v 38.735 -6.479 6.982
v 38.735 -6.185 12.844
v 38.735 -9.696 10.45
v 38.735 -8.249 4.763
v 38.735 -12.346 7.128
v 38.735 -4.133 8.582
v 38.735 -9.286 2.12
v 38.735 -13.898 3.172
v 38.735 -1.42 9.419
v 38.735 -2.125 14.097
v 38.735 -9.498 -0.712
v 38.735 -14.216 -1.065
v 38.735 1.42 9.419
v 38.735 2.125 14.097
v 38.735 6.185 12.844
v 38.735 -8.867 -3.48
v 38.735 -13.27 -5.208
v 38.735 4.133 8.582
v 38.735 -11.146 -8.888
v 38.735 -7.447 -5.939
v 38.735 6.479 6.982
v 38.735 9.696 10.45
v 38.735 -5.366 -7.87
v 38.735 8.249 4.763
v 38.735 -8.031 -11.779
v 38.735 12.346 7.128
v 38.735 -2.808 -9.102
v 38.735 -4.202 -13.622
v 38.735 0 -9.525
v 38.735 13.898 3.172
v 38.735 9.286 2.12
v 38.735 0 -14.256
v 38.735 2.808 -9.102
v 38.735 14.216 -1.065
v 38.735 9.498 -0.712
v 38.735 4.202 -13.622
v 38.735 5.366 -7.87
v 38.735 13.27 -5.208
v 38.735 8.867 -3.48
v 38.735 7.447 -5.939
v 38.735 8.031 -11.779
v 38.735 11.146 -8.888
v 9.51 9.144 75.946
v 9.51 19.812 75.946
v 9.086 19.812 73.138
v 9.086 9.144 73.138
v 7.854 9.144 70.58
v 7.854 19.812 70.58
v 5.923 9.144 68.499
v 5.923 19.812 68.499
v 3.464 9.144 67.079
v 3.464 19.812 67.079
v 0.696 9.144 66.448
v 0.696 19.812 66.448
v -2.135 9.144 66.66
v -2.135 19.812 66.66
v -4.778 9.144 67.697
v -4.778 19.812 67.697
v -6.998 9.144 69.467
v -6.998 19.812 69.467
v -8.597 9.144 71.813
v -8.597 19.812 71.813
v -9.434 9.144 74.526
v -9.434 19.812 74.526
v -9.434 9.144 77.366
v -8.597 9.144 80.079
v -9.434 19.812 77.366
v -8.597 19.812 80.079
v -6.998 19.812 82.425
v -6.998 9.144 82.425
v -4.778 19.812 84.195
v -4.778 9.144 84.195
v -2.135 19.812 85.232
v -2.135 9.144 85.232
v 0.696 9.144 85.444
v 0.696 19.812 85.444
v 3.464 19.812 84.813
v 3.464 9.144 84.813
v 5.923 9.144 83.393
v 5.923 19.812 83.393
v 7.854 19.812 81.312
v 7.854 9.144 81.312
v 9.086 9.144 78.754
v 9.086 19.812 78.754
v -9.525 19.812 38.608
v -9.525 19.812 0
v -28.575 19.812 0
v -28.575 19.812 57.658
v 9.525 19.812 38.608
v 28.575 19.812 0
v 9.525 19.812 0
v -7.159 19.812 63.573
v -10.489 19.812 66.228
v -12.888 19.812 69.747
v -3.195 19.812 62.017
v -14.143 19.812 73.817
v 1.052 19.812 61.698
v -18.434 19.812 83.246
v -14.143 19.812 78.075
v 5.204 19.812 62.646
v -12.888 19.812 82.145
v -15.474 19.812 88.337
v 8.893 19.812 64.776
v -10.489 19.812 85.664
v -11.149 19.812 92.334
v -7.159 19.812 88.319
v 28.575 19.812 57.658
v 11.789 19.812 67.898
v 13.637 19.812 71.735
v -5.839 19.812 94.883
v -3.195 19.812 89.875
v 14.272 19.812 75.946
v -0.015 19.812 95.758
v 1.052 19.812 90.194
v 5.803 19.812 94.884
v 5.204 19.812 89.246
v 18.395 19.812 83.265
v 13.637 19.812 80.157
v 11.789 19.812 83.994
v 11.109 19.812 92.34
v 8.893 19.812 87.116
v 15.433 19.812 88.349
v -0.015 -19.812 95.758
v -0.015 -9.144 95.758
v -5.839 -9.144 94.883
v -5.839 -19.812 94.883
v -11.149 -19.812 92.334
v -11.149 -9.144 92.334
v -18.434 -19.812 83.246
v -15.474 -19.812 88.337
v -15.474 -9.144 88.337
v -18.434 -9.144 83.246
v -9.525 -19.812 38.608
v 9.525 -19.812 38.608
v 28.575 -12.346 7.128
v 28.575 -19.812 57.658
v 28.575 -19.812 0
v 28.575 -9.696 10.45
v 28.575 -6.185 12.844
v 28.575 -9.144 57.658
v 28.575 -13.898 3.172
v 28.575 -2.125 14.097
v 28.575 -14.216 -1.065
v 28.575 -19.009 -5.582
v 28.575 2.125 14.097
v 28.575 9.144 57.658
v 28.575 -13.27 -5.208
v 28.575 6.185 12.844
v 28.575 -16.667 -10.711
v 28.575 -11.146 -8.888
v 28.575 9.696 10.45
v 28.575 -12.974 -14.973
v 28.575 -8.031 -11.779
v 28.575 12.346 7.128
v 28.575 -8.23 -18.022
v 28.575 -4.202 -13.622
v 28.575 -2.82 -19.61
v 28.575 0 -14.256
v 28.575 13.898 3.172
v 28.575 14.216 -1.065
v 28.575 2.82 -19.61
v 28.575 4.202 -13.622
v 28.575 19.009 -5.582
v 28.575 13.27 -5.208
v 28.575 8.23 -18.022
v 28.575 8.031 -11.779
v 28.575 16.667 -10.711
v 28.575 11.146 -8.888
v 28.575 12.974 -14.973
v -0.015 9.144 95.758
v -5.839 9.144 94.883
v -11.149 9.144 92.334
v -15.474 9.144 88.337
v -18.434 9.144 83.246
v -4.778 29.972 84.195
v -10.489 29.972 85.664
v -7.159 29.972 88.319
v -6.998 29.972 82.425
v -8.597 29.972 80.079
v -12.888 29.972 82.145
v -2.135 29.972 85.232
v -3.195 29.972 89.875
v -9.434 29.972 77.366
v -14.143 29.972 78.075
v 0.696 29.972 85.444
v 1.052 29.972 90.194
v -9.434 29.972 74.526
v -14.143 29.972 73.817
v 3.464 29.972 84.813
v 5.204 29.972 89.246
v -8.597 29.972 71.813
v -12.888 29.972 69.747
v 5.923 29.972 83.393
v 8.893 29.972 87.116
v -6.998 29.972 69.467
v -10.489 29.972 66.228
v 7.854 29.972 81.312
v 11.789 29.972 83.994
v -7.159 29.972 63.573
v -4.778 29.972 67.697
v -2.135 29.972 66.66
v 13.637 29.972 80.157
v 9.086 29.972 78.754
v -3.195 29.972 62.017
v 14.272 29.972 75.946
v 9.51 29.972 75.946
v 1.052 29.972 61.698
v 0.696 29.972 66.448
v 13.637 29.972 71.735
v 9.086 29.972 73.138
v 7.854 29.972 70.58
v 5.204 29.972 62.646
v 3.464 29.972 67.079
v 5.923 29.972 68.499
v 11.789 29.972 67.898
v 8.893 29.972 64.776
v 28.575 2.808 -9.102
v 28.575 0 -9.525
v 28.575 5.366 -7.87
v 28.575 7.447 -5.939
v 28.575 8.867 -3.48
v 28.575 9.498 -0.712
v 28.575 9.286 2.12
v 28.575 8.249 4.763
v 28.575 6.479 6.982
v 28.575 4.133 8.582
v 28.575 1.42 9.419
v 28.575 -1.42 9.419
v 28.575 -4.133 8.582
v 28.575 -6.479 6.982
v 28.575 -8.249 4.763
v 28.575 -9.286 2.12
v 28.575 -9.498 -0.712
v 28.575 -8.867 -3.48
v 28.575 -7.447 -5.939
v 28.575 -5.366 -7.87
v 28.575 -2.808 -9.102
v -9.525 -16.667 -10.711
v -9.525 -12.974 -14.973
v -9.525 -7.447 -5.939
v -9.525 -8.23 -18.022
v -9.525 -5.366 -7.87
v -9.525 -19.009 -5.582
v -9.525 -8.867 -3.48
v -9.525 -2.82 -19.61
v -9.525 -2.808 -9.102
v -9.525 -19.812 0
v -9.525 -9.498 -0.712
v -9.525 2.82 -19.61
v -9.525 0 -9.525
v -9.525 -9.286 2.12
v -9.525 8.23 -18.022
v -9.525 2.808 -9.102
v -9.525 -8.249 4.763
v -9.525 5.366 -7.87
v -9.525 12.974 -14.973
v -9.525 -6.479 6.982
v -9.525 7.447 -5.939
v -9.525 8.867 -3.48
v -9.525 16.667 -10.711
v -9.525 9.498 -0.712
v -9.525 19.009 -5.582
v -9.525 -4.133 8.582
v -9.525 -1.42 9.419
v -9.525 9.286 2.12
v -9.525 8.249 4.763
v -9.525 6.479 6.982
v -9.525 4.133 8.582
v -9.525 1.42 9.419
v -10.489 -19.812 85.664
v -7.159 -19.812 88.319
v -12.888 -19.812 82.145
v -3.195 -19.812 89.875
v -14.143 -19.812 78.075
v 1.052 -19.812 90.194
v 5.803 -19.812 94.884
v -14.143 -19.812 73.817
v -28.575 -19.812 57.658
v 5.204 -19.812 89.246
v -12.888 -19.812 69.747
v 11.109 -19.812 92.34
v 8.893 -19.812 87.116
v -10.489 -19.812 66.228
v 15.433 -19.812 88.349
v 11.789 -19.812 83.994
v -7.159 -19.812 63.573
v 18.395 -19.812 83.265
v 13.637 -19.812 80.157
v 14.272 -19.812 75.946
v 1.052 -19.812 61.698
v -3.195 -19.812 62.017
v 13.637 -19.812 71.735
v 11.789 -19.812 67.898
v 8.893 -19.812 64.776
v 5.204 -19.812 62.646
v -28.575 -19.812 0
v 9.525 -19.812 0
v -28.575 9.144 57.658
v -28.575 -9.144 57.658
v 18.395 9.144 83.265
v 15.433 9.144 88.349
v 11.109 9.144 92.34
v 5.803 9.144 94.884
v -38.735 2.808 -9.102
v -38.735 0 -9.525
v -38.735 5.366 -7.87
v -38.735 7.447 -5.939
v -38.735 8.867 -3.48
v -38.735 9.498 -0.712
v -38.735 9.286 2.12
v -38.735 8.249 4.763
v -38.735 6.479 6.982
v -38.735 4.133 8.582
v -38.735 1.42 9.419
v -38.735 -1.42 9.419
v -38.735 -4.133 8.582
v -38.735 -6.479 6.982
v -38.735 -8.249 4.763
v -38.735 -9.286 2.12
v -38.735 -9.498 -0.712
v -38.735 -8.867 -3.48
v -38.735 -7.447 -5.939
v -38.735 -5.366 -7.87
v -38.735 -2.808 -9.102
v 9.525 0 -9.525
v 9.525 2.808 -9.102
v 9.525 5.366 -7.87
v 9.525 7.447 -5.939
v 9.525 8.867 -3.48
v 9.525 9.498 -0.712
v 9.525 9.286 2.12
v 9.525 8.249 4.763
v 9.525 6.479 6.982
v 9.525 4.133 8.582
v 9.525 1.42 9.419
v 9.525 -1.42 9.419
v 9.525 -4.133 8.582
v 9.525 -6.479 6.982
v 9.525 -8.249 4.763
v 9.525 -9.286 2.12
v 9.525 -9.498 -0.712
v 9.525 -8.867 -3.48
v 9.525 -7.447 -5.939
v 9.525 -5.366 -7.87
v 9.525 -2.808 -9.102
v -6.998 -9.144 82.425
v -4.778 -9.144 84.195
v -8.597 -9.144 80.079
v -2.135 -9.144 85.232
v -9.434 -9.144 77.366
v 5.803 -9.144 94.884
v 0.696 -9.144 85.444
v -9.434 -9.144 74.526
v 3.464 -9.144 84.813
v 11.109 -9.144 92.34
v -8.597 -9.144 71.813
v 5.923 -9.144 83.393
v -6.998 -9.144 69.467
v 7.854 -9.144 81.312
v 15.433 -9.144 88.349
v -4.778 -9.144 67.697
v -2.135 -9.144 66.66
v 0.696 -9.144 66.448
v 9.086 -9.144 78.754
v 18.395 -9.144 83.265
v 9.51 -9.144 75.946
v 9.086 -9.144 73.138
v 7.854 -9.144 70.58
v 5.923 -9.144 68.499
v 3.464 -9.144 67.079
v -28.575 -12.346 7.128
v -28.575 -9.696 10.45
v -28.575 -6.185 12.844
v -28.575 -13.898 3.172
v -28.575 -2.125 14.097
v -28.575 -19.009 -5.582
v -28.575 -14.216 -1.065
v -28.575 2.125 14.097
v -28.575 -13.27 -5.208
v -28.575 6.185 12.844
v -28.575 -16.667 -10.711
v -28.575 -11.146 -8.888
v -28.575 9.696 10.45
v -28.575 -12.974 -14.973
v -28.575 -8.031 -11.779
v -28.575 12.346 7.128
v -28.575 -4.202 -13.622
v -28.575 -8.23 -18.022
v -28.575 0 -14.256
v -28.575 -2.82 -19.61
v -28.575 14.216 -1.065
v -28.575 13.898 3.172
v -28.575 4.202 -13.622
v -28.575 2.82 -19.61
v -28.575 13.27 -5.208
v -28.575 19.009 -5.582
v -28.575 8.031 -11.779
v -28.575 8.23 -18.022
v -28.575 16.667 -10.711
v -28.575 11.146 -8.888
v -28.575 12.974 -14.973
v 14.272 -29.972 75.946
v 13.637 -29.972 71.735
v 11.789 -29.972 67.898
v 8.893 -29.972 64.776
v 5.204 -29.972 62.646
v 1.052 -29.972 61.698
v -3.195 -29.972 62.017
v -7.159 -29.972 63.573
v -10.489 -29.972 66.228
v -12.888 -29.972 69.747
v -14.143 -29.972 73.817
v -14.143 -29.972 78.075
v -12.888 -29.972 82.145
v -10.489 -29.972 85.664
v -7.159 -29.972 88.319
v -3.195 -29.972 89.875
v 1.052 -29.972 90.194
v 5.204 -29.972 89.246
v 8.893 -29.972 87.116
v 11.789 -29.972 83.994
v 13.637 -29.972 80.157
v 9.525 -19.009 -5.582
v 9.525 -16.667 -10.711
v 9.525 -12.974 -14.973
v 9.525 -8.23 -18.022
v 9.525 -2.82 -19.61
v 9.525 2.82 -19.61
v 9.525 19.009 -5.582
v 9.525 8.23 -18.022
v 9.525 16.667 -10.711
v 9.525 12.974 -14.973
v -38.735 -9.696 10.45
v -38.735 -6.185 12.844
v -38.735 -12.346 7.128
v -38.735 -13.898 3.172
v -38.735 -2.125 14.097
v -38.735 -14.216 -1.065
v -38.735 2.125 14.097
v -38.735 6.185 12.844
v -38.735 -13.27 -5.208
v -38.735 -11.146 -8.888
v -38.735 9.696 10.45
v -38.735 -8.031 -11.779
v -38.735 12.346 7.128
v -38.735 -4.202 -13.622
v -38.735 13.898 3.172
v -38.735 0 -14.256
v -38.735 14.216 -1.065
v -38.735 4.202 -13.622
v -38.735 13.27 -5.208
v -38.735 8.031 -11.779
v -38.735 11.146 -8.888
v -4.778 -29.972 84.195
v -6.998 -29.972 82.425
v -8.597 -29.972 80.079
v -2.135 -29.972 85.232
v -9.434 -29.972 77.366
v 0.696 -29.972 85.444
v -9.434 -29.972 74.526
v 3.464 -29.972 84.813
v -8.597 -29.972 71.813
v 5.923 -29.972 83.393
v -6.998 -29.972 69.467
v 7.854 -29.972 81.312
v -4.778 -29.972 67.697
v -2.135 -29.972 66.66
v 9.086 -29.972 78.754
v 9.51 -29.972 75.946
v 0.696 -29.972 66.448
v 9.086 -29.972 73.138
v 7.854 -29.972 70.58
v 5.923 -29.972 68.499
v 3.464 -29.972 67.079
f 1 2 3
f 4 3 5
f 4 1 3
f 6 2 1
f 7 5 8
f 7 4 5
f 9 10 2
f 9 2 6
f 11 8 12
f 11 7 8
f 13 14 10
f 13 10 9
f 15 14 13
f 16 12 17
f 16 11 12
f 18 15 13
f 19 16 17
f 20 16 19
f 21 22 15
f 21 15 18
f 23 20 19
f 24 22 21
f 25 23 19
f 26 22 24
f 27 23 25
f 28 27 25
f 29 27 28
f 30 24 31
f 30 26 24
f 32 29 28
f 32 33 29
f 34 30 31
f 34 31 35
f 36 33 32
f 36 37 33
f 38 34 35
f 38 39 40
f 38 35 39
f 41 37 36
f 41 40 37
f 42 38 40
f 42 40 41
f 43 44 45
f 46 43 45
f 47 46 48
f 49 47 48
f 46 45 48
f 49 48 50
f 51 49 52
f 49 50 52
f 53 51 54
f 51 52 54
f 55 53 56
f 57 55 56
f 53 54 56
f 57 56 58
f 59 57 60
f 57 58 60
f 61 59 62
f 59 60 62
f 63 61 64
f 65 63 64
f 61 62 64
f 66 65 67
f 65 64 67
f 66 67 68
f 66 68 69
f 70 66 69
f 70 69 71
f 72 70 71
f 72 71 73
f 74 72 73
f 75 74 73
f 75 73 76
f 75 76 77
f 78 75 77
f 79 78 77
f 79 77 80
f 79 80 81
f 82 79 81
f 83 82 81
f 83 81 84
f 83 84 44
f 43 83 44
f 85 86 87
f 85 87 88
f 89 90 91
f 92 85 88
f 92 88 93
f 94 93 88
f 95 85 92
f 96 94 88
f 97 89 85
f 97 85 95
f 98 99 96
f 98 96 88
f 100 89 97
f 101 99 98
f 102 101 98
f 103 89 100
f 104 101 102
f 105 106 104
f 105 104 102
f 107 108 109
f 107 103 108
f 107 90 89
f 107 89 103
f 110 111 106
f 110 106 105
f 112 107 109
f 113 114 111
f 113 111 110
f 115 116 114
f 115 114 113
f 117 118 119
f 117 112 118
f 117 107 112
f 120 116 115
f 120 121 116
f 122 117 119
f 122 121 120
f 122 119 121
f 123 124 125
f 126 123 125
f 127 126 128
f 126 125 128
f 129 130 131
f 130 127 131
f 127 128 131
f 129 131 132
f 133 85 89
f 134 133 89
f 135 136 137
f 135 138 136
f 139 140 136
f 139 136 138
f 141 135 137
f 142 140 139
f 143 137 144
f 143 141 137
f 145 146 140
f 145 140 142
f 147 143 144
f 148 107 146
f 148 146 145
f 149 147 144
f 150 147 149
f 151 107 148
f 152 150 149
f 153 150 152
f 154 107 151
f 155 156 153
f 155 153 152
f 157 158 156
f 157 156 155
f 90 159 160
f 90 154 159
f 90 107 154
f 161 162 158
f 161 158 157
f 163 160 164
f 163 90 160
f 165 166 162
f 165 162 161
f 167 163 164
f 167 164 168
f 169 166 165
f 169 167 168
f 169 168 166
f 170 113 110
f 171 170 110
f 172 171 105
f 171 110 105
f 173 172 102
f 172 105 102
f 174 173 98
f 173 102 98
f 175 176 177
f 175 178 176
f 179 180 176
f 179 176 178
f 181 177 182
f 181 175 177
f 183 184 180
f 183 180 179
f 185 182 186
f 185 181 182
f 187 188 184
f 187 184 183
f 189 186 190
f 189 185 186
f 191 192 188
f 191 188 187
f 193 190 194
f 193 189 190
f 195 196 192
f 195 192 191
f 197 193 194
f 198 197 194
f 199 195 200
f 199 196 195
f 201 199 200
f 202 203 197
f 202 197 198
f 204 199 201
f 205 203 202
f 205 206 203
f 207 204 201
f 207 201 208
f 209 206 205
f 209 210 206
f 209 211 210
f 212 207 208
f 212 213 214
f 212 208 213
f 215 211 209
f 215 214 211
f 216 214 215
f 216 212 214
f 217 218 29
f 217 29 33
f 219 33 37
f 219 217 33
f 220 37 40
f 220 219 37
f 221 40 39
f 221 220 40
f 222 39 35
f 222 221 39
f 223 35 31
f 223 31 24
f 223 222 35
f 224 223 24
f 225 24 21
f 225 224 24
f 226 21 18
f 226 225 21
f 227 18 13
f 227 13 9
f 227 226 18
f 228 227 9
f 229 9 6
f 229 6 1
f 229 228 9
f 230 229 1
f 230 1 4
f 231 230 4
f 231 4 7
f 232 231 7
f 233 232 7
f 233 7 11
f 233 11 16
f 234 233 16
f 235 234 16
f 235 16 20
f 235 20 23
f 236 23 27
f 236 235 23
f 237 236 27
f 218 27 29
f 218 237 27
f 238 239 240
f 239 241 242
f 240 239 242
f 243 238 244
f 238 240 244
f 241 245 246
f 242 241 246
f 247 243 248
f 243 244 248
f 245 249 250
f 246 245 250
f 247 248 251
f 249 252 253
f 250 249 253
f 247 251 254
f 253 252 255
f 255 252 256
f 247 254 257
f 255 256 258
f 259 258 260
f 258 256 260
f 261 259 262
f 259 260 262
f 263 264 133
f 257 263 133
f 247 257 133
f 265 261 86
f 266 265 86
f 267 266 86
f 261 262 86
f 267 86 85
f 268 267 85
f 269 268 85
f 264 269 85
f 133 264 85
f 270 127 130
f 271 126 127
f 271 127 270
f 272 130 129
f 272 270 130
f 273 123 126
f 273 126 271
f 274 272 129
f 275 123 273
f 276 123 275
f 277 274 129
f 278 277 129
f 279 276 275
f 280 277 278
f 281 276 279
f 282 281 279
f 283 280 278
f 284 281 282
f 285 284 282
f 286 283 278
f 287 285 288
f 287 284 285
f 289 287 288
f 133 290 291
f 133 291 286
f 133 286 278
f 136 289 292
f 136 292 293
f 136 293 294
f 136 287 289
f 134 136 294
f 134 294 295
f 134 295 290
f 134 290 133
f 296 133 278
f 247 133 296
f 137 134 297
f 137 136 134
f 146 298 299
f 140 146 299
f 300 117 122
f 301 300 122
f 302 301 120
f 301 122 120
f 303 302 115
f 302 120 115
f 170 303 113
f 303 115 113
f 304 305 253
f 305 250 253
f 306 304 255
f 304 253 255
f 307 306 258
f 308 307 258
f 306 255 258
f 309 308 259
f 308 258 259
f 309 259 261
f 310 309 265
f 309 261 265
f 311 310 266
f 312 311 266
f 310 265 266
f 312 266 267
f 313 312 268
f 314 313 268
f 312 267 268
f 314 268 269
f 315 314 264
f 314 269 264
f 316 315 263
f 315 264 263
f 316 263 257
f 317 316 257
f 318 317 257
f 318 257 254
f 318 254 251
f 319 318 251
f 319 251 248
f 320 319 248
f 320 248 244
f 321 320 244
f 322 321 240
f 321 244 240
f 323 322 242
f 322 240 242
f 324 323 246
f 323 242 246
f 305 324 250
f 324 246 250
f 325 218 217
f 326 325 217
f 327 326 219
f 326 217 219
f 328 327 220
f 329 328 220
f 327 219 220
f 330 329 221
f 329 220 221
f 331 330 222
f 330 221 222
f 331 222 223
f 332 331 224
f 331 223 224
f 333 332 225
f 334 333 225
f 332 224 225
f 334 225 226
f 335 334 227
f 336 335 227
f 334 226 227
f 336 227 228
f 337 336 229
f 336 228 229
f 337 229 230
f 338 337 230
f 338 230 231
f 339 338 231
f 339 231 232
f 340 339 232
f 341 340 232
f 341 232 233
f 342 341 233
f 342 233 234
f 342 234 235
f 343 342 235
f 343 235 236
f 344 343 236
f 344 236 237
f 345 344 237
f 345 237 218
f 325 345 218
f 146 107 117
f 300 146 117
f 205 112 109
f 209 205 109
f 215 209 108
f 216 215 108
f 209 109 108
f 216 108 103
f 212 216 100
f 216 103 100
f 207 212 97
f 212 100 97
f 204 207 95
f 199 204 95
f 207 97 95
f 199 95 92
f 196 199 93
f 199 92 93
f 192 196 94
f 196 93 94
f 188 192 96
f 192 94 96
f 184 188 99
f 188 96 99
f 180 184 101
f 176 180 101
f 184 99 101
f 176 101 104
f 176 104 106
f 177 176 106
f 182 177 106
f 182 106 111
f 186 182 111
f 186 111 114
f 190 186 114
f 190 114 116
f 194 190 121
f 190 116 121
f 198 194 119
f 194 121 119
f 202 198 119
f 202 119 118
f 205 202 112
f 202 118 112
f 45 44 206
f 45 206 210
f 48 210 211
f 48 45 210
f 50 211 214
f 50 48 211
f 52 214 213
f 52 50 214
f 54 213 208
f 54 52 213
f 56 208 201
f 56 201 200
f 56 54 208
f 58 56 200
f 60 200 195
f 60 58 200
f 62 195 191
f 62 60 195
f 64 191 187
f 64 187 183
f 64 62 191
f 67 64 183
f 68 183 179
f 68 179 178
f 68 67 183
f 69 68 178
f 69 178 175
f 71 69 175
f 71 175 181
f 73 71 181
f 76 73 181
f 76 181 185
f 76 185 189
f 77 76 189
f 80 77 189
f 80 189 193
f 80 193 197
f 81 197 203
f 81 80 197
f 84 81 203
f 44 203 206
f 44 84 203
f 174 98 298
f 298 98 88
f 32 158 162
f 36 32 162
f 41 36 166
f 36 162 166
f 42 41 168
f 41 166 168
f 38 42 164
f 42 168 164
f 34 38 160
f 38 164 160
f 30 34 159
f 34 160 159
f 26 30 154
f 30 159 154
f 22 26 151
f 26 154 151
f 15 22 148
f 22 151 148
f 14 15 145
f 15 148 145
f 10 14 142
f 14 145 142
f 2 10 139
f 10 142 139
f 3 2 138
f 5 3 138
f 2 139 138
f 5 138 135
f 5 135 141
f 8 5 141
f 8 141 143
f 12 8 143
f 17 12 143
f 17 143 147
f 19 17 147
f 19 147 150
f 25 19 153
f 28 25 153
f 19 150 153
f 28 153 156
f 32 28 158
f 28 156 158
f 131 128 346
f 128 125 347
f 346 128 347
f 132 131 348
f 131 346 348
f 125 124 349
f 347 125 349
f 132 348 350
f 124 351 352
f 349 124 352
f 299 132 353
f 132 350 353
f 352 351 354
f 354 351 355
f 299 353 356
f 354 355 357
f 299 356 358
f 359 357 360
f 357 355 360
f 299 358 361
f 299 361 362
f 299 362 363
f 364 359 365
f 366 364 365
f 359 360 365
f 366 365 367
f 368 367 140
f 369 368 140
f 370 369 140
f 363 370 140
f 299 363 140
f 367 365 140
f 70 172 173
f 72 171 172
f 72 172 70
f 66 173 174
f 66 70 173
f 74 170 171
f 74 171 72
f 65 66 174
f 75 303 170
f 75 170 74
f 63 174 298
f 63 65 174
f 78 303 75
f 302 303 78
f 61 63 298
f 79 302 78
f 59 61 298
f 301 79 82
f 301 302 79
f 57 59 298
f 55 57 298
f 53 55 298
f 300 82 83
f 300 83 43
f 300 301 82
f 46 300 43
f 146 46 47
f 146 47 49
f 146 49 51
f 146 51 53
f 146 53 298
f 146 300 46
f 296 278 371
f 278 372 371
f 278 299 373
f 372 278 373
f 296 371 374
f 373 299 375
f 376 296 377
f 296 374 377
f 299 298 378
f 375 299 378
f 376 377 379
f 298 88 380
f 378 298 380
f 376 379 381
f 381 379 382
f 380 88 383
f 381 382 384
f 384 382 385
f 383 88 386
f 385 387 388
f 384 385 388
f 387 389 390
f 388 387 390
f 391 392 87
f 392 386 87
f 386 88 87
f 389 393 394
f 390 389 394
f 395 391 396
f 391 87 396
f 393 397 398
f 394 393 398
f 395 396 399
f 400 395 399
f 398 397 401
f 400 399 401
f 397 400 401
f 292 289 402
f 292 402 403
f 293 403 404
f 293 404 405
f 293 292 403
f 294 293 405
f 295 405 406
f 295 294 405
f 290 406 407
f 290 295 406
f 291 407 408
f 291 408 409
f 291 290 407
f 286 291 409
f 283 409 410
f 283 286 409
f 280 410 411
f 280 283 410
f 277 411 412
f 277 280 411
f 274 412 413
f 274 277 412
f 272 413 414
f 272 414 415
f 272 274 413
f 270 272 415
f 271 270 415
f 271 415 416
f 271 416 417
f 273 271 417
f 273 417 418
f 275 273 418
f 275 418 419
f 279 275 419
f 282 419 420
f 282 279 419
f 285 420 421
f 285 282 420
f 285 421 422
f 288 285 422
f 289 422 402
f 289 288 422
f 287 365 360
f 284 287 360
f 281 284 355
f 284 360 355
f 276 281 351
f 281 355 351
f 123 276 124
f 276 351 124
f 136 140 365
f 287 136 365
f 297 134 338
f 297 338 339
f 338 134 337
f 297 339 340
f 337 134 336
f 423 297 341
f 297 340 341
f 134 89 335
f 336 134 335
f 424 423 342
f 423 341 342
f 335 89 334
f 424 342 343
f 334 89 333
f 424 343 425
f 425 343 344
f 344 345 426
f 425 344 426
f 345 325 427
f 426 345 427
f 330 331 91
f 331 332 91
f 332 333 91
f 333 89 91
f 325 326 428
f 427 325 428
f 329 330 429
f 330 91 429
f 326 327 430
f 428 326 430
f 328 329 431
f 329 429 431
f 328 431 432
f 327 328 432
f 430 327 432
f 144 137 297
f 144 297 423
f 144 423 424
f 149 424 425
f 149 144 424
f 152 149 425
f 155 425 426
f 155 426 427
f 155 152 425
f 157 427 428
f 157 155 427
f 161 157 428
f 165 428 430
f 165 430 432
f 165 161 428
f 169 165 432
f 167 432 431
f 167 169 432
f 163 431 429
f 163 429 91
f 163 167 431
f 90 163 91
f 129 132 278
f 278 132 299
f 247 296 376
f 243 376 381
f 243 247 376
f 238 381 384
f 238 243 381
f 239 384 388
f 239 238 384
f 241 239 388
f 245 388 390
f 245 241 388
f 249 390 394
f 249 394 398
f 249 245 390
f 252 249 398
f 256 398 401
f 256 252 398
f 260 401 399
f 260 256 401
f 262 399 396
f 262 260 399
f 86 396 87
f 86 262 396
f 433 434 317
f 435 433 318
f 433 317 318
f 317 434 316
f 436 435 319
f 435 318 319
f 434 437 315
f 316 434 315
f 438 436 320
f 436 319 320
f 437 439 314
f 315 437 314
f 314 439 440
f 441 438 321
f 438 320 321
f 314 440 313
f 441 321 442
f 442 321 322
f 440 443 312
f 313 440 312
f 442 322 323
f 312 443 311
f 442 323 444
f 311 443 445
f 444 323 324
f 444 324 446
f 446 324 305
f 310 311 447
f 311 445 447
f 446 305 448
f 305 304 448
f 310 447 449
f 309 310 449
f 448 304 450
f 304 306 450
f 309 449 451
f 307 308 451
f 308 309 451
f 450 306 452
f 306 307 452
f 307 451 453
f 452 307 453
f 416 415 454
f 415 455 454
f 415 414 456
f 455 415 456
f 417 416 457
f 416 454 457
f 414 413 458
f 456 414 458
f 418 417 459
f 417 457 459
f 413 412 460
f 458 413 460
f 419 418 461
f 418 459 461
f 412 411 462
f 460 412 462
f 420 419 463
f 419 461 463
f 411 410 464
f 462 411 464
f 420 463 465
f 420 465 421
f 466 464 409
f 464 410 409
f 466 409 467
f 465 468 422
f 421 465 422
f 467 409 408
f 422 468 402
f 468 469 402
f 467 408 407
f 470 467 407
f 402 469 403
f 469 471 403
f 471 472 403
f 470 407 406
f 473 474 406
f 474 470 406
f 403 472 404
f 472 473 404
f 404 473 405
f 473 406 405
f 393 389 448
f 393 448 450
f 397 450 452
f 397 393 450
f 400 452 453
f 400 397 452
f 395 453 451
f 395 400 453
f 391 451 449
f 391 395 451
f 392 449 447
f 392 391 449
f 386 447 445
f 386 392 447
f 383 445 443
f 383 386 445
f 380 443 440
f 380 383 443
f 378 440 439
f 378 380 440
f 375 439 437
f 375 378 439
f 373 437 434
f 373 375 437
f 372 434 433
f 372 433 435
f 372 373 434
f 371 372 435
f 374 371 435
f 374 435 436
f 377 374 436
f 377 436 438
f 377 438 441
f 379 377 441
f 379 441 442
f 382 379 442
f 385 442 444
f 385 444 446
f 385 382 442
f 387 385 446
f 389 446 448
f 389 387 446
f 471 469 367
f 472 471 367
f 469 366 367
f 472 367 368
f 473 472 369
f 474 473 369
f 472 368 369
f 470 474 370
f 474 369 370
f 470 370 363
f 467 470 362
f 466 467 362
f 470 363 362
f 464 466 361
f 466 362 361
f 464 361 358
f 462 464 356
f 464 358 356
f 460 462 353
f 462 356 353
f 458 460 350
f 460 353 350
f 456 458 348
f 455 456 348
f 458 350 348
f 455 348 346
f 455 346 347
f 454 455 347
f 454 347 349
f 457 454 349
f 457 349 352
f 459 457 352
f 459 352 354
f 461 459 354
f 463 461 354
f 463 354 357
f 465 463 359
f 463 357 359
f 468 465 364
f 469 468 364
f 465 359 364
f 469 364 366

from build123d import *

# Parameters (mm, degrees)
SKETCH3_W           = 38.1
SKETCH3_H           = 10.668
BOSS_EXTRUDE1_DEPTH = 28.575
SKETCH4_W           = 19.05
SKETCH4_H           = 38.608
SKETCH4_H_2         = 19.812
SKETCH4_R           = 9.525
CUT_EXTRUDE1_DEPTH  = 40.624
SKETCH5_R           = 14.2875
SKETCH5_R_2         = 9.525
BOSS_EXTRUDE2_DEPTH = 10.16
BOSS_EXTRUDE3_START = -39.624
SKETCH5_3_R         = 14.2875
SKETCH5_3_R_2       = 9.525
BOSS_EXTRUDE3_DEPTH = 10.16
SKETCH6_R           = 9.525
CUT_EXTRUDE2_DEPTH  = 58.15
SKETCH7_R           = 14.25575
SKETCH7_R_2         = 9.525
BOSS_EXTRUDE4_DEPTH = 10.16
BOSS_EXTRUDE5_START = -57.15
SKETCH7_2_R         = 14.25575
SKETCH7_2_R_2       = 9.525
BOSS_EXTRUDE5_DEPTH = 10.16


with BuildPart() as part:
    # Sketch3 → Boss-Extrude1 (new body, symmetric)
    with BuildSketch(Plane(origin=(0, 0, 0), x_dir=(0, 0, -1), z_dir=(1, 0, 0))):
        with BuildLine():
            ThreePointArc((0, -19.812), (19.812, 0), (0, 19.812))
            Line((0, 19.812), (-57.658, 19.812))
            Line((-57.658, 19.812), (-57.658, 9.144))
            Line((-57.658, 9.144), (-57.658, -9.144))
            Line((-57.658, -9.144), (-57.658, -19.812))
            Line((-57.658, -19.812), (0, -19.812))
        make_face()
        with Locations((-76.708, 14.478)):
            Rectangle(SKETCH3_W, SKETCH3_H)
        with Locations((-76.708, -14.478)):
            Rectangle(SKETCH3_W, SKETCH3_H)
    extrude(amount=BOSS_EXTRUDE1_DEPTH, both=True)

    # Sketch4 → Cut-Extrude1 (cut, through all)
    with BuildSketch(Plane(origin=(0, 19.812, 0), x_dir=(1, 0, 0), z_dir=(0, 1, 0))):
        with Locations((0, -19.304)):
            Rectangle(SKETCH4_W, SKETCH4_H)
        with Locations((0, 9.906)):
            Rectangle(SKETCH4_W, SKETCH4_H_2)
        with BuildLine():
            Line((28.575, -95.758), (28.575, -57.658))
            Line((28.575, -57.658), (18.395099317, -83.264992565))
            ThreePointArc((18.395099317, -83.264992565), (11.109122589, -92.339889472), (-0.015432736, -95.758))
            Line((-0.015432736, -95.758), (28.575, -95.758))
        make_face()
        with Locations((-0.015432773, -75.946)):
            Circle(SKETCH4_R)
        with BuildLine():
            Line((-18.433578911, -83.24581074), (-28.575, -57.658))
            Line((-28.575, -57.658), (-28.575, -95.758))
            Line((-28.575, -95.758), (-0.015432736, -95.758))
            ThreePointArc((-0.015432736, -95.758), (-11.148525176, -92.334093164), (-18.433578911, -83.24581074))
        make_face()
    extrude(amount=-CUT_EXTRUDE1_DEPTH, mode=Mode.SUBTRACT)

    # Sketch5 → Boss-Extrude2 (add)
    with BuildSketch(Plane(origin=(0, 19.812, 0), x_dir=(1, 0, 0), z_dir=(0, 1, 0))):
        with Locations((-0.015432773, -75.946)):
            Circle(SKETCH5_R)
        with Locations((-0.015432773, -75.946)):
            Circle(SKETCH5_R_2, mode=Mode.SUBTRACT)
    extrude(amount=BOSS_EXTRUDE2_DEPTH)

    # Sketch5<3> → Boss-Extrude3 (add)
    with BuildSketch(Plane(origin=(0, 19.812, 0), x_dir=(1, 0, 0), z_dir=(0, 1, 0)).offset(BOSS_EXTRUDE3_START)):
        with Locations((-0.015432773, -75.946)):
            Circle(SKETCH5_3_R)
        with Locations((-0.015432773, -75.946)):
            Circle(SKETCH5_3_R_2, mode=Mode.SUBTRACT)
    extrude(amount=-BOSS_EXTRUDE3_DEPTH)

    # Sketch6 → Cut-Extrude2 (cut, through all)
    with BuildSketch(Plane(origin=(28.575, 0, 0), x_dir=(0, 0, -1), z_dir=(1, 0, 0))):
        Circle(SKETCH6_R)
    extrude(amount=-CUT_EXTRUDE2_DEPTH, mode=Mode.SUBTRACT)

    # Sketch7 → Boss-Extrude4 (add)
    with BuildSketch(Plane(origin=(28.575, 0, 0), x_dir=(0, 0, -1), z_dir=(1, 0, 0))):
        Circle(SKETCH7_R)
        Circle(SKETCH7_R_2, mode=Mode.SUBTRACT)
    extrude(amount=BOSS_EXTRUDE4_DEPTH)

    # Sketch7<2> → Boss-Extrude5 (add)
    with BuildSketch(Plane(origin=(28.575, 0, 0), x_dir=(0, 0, -1), z_dir=(1, 0, 0)).offset(BOSS_EXTRUDE5_START)):
        Circle(SKETCH7_2_R)
        Circle(SKETCH7_2_R_2, mode=Mode.SUBTRACT)
    extrude(amount=-BOSS_EXTRUDE5_DEPTH)


solid = part.part
